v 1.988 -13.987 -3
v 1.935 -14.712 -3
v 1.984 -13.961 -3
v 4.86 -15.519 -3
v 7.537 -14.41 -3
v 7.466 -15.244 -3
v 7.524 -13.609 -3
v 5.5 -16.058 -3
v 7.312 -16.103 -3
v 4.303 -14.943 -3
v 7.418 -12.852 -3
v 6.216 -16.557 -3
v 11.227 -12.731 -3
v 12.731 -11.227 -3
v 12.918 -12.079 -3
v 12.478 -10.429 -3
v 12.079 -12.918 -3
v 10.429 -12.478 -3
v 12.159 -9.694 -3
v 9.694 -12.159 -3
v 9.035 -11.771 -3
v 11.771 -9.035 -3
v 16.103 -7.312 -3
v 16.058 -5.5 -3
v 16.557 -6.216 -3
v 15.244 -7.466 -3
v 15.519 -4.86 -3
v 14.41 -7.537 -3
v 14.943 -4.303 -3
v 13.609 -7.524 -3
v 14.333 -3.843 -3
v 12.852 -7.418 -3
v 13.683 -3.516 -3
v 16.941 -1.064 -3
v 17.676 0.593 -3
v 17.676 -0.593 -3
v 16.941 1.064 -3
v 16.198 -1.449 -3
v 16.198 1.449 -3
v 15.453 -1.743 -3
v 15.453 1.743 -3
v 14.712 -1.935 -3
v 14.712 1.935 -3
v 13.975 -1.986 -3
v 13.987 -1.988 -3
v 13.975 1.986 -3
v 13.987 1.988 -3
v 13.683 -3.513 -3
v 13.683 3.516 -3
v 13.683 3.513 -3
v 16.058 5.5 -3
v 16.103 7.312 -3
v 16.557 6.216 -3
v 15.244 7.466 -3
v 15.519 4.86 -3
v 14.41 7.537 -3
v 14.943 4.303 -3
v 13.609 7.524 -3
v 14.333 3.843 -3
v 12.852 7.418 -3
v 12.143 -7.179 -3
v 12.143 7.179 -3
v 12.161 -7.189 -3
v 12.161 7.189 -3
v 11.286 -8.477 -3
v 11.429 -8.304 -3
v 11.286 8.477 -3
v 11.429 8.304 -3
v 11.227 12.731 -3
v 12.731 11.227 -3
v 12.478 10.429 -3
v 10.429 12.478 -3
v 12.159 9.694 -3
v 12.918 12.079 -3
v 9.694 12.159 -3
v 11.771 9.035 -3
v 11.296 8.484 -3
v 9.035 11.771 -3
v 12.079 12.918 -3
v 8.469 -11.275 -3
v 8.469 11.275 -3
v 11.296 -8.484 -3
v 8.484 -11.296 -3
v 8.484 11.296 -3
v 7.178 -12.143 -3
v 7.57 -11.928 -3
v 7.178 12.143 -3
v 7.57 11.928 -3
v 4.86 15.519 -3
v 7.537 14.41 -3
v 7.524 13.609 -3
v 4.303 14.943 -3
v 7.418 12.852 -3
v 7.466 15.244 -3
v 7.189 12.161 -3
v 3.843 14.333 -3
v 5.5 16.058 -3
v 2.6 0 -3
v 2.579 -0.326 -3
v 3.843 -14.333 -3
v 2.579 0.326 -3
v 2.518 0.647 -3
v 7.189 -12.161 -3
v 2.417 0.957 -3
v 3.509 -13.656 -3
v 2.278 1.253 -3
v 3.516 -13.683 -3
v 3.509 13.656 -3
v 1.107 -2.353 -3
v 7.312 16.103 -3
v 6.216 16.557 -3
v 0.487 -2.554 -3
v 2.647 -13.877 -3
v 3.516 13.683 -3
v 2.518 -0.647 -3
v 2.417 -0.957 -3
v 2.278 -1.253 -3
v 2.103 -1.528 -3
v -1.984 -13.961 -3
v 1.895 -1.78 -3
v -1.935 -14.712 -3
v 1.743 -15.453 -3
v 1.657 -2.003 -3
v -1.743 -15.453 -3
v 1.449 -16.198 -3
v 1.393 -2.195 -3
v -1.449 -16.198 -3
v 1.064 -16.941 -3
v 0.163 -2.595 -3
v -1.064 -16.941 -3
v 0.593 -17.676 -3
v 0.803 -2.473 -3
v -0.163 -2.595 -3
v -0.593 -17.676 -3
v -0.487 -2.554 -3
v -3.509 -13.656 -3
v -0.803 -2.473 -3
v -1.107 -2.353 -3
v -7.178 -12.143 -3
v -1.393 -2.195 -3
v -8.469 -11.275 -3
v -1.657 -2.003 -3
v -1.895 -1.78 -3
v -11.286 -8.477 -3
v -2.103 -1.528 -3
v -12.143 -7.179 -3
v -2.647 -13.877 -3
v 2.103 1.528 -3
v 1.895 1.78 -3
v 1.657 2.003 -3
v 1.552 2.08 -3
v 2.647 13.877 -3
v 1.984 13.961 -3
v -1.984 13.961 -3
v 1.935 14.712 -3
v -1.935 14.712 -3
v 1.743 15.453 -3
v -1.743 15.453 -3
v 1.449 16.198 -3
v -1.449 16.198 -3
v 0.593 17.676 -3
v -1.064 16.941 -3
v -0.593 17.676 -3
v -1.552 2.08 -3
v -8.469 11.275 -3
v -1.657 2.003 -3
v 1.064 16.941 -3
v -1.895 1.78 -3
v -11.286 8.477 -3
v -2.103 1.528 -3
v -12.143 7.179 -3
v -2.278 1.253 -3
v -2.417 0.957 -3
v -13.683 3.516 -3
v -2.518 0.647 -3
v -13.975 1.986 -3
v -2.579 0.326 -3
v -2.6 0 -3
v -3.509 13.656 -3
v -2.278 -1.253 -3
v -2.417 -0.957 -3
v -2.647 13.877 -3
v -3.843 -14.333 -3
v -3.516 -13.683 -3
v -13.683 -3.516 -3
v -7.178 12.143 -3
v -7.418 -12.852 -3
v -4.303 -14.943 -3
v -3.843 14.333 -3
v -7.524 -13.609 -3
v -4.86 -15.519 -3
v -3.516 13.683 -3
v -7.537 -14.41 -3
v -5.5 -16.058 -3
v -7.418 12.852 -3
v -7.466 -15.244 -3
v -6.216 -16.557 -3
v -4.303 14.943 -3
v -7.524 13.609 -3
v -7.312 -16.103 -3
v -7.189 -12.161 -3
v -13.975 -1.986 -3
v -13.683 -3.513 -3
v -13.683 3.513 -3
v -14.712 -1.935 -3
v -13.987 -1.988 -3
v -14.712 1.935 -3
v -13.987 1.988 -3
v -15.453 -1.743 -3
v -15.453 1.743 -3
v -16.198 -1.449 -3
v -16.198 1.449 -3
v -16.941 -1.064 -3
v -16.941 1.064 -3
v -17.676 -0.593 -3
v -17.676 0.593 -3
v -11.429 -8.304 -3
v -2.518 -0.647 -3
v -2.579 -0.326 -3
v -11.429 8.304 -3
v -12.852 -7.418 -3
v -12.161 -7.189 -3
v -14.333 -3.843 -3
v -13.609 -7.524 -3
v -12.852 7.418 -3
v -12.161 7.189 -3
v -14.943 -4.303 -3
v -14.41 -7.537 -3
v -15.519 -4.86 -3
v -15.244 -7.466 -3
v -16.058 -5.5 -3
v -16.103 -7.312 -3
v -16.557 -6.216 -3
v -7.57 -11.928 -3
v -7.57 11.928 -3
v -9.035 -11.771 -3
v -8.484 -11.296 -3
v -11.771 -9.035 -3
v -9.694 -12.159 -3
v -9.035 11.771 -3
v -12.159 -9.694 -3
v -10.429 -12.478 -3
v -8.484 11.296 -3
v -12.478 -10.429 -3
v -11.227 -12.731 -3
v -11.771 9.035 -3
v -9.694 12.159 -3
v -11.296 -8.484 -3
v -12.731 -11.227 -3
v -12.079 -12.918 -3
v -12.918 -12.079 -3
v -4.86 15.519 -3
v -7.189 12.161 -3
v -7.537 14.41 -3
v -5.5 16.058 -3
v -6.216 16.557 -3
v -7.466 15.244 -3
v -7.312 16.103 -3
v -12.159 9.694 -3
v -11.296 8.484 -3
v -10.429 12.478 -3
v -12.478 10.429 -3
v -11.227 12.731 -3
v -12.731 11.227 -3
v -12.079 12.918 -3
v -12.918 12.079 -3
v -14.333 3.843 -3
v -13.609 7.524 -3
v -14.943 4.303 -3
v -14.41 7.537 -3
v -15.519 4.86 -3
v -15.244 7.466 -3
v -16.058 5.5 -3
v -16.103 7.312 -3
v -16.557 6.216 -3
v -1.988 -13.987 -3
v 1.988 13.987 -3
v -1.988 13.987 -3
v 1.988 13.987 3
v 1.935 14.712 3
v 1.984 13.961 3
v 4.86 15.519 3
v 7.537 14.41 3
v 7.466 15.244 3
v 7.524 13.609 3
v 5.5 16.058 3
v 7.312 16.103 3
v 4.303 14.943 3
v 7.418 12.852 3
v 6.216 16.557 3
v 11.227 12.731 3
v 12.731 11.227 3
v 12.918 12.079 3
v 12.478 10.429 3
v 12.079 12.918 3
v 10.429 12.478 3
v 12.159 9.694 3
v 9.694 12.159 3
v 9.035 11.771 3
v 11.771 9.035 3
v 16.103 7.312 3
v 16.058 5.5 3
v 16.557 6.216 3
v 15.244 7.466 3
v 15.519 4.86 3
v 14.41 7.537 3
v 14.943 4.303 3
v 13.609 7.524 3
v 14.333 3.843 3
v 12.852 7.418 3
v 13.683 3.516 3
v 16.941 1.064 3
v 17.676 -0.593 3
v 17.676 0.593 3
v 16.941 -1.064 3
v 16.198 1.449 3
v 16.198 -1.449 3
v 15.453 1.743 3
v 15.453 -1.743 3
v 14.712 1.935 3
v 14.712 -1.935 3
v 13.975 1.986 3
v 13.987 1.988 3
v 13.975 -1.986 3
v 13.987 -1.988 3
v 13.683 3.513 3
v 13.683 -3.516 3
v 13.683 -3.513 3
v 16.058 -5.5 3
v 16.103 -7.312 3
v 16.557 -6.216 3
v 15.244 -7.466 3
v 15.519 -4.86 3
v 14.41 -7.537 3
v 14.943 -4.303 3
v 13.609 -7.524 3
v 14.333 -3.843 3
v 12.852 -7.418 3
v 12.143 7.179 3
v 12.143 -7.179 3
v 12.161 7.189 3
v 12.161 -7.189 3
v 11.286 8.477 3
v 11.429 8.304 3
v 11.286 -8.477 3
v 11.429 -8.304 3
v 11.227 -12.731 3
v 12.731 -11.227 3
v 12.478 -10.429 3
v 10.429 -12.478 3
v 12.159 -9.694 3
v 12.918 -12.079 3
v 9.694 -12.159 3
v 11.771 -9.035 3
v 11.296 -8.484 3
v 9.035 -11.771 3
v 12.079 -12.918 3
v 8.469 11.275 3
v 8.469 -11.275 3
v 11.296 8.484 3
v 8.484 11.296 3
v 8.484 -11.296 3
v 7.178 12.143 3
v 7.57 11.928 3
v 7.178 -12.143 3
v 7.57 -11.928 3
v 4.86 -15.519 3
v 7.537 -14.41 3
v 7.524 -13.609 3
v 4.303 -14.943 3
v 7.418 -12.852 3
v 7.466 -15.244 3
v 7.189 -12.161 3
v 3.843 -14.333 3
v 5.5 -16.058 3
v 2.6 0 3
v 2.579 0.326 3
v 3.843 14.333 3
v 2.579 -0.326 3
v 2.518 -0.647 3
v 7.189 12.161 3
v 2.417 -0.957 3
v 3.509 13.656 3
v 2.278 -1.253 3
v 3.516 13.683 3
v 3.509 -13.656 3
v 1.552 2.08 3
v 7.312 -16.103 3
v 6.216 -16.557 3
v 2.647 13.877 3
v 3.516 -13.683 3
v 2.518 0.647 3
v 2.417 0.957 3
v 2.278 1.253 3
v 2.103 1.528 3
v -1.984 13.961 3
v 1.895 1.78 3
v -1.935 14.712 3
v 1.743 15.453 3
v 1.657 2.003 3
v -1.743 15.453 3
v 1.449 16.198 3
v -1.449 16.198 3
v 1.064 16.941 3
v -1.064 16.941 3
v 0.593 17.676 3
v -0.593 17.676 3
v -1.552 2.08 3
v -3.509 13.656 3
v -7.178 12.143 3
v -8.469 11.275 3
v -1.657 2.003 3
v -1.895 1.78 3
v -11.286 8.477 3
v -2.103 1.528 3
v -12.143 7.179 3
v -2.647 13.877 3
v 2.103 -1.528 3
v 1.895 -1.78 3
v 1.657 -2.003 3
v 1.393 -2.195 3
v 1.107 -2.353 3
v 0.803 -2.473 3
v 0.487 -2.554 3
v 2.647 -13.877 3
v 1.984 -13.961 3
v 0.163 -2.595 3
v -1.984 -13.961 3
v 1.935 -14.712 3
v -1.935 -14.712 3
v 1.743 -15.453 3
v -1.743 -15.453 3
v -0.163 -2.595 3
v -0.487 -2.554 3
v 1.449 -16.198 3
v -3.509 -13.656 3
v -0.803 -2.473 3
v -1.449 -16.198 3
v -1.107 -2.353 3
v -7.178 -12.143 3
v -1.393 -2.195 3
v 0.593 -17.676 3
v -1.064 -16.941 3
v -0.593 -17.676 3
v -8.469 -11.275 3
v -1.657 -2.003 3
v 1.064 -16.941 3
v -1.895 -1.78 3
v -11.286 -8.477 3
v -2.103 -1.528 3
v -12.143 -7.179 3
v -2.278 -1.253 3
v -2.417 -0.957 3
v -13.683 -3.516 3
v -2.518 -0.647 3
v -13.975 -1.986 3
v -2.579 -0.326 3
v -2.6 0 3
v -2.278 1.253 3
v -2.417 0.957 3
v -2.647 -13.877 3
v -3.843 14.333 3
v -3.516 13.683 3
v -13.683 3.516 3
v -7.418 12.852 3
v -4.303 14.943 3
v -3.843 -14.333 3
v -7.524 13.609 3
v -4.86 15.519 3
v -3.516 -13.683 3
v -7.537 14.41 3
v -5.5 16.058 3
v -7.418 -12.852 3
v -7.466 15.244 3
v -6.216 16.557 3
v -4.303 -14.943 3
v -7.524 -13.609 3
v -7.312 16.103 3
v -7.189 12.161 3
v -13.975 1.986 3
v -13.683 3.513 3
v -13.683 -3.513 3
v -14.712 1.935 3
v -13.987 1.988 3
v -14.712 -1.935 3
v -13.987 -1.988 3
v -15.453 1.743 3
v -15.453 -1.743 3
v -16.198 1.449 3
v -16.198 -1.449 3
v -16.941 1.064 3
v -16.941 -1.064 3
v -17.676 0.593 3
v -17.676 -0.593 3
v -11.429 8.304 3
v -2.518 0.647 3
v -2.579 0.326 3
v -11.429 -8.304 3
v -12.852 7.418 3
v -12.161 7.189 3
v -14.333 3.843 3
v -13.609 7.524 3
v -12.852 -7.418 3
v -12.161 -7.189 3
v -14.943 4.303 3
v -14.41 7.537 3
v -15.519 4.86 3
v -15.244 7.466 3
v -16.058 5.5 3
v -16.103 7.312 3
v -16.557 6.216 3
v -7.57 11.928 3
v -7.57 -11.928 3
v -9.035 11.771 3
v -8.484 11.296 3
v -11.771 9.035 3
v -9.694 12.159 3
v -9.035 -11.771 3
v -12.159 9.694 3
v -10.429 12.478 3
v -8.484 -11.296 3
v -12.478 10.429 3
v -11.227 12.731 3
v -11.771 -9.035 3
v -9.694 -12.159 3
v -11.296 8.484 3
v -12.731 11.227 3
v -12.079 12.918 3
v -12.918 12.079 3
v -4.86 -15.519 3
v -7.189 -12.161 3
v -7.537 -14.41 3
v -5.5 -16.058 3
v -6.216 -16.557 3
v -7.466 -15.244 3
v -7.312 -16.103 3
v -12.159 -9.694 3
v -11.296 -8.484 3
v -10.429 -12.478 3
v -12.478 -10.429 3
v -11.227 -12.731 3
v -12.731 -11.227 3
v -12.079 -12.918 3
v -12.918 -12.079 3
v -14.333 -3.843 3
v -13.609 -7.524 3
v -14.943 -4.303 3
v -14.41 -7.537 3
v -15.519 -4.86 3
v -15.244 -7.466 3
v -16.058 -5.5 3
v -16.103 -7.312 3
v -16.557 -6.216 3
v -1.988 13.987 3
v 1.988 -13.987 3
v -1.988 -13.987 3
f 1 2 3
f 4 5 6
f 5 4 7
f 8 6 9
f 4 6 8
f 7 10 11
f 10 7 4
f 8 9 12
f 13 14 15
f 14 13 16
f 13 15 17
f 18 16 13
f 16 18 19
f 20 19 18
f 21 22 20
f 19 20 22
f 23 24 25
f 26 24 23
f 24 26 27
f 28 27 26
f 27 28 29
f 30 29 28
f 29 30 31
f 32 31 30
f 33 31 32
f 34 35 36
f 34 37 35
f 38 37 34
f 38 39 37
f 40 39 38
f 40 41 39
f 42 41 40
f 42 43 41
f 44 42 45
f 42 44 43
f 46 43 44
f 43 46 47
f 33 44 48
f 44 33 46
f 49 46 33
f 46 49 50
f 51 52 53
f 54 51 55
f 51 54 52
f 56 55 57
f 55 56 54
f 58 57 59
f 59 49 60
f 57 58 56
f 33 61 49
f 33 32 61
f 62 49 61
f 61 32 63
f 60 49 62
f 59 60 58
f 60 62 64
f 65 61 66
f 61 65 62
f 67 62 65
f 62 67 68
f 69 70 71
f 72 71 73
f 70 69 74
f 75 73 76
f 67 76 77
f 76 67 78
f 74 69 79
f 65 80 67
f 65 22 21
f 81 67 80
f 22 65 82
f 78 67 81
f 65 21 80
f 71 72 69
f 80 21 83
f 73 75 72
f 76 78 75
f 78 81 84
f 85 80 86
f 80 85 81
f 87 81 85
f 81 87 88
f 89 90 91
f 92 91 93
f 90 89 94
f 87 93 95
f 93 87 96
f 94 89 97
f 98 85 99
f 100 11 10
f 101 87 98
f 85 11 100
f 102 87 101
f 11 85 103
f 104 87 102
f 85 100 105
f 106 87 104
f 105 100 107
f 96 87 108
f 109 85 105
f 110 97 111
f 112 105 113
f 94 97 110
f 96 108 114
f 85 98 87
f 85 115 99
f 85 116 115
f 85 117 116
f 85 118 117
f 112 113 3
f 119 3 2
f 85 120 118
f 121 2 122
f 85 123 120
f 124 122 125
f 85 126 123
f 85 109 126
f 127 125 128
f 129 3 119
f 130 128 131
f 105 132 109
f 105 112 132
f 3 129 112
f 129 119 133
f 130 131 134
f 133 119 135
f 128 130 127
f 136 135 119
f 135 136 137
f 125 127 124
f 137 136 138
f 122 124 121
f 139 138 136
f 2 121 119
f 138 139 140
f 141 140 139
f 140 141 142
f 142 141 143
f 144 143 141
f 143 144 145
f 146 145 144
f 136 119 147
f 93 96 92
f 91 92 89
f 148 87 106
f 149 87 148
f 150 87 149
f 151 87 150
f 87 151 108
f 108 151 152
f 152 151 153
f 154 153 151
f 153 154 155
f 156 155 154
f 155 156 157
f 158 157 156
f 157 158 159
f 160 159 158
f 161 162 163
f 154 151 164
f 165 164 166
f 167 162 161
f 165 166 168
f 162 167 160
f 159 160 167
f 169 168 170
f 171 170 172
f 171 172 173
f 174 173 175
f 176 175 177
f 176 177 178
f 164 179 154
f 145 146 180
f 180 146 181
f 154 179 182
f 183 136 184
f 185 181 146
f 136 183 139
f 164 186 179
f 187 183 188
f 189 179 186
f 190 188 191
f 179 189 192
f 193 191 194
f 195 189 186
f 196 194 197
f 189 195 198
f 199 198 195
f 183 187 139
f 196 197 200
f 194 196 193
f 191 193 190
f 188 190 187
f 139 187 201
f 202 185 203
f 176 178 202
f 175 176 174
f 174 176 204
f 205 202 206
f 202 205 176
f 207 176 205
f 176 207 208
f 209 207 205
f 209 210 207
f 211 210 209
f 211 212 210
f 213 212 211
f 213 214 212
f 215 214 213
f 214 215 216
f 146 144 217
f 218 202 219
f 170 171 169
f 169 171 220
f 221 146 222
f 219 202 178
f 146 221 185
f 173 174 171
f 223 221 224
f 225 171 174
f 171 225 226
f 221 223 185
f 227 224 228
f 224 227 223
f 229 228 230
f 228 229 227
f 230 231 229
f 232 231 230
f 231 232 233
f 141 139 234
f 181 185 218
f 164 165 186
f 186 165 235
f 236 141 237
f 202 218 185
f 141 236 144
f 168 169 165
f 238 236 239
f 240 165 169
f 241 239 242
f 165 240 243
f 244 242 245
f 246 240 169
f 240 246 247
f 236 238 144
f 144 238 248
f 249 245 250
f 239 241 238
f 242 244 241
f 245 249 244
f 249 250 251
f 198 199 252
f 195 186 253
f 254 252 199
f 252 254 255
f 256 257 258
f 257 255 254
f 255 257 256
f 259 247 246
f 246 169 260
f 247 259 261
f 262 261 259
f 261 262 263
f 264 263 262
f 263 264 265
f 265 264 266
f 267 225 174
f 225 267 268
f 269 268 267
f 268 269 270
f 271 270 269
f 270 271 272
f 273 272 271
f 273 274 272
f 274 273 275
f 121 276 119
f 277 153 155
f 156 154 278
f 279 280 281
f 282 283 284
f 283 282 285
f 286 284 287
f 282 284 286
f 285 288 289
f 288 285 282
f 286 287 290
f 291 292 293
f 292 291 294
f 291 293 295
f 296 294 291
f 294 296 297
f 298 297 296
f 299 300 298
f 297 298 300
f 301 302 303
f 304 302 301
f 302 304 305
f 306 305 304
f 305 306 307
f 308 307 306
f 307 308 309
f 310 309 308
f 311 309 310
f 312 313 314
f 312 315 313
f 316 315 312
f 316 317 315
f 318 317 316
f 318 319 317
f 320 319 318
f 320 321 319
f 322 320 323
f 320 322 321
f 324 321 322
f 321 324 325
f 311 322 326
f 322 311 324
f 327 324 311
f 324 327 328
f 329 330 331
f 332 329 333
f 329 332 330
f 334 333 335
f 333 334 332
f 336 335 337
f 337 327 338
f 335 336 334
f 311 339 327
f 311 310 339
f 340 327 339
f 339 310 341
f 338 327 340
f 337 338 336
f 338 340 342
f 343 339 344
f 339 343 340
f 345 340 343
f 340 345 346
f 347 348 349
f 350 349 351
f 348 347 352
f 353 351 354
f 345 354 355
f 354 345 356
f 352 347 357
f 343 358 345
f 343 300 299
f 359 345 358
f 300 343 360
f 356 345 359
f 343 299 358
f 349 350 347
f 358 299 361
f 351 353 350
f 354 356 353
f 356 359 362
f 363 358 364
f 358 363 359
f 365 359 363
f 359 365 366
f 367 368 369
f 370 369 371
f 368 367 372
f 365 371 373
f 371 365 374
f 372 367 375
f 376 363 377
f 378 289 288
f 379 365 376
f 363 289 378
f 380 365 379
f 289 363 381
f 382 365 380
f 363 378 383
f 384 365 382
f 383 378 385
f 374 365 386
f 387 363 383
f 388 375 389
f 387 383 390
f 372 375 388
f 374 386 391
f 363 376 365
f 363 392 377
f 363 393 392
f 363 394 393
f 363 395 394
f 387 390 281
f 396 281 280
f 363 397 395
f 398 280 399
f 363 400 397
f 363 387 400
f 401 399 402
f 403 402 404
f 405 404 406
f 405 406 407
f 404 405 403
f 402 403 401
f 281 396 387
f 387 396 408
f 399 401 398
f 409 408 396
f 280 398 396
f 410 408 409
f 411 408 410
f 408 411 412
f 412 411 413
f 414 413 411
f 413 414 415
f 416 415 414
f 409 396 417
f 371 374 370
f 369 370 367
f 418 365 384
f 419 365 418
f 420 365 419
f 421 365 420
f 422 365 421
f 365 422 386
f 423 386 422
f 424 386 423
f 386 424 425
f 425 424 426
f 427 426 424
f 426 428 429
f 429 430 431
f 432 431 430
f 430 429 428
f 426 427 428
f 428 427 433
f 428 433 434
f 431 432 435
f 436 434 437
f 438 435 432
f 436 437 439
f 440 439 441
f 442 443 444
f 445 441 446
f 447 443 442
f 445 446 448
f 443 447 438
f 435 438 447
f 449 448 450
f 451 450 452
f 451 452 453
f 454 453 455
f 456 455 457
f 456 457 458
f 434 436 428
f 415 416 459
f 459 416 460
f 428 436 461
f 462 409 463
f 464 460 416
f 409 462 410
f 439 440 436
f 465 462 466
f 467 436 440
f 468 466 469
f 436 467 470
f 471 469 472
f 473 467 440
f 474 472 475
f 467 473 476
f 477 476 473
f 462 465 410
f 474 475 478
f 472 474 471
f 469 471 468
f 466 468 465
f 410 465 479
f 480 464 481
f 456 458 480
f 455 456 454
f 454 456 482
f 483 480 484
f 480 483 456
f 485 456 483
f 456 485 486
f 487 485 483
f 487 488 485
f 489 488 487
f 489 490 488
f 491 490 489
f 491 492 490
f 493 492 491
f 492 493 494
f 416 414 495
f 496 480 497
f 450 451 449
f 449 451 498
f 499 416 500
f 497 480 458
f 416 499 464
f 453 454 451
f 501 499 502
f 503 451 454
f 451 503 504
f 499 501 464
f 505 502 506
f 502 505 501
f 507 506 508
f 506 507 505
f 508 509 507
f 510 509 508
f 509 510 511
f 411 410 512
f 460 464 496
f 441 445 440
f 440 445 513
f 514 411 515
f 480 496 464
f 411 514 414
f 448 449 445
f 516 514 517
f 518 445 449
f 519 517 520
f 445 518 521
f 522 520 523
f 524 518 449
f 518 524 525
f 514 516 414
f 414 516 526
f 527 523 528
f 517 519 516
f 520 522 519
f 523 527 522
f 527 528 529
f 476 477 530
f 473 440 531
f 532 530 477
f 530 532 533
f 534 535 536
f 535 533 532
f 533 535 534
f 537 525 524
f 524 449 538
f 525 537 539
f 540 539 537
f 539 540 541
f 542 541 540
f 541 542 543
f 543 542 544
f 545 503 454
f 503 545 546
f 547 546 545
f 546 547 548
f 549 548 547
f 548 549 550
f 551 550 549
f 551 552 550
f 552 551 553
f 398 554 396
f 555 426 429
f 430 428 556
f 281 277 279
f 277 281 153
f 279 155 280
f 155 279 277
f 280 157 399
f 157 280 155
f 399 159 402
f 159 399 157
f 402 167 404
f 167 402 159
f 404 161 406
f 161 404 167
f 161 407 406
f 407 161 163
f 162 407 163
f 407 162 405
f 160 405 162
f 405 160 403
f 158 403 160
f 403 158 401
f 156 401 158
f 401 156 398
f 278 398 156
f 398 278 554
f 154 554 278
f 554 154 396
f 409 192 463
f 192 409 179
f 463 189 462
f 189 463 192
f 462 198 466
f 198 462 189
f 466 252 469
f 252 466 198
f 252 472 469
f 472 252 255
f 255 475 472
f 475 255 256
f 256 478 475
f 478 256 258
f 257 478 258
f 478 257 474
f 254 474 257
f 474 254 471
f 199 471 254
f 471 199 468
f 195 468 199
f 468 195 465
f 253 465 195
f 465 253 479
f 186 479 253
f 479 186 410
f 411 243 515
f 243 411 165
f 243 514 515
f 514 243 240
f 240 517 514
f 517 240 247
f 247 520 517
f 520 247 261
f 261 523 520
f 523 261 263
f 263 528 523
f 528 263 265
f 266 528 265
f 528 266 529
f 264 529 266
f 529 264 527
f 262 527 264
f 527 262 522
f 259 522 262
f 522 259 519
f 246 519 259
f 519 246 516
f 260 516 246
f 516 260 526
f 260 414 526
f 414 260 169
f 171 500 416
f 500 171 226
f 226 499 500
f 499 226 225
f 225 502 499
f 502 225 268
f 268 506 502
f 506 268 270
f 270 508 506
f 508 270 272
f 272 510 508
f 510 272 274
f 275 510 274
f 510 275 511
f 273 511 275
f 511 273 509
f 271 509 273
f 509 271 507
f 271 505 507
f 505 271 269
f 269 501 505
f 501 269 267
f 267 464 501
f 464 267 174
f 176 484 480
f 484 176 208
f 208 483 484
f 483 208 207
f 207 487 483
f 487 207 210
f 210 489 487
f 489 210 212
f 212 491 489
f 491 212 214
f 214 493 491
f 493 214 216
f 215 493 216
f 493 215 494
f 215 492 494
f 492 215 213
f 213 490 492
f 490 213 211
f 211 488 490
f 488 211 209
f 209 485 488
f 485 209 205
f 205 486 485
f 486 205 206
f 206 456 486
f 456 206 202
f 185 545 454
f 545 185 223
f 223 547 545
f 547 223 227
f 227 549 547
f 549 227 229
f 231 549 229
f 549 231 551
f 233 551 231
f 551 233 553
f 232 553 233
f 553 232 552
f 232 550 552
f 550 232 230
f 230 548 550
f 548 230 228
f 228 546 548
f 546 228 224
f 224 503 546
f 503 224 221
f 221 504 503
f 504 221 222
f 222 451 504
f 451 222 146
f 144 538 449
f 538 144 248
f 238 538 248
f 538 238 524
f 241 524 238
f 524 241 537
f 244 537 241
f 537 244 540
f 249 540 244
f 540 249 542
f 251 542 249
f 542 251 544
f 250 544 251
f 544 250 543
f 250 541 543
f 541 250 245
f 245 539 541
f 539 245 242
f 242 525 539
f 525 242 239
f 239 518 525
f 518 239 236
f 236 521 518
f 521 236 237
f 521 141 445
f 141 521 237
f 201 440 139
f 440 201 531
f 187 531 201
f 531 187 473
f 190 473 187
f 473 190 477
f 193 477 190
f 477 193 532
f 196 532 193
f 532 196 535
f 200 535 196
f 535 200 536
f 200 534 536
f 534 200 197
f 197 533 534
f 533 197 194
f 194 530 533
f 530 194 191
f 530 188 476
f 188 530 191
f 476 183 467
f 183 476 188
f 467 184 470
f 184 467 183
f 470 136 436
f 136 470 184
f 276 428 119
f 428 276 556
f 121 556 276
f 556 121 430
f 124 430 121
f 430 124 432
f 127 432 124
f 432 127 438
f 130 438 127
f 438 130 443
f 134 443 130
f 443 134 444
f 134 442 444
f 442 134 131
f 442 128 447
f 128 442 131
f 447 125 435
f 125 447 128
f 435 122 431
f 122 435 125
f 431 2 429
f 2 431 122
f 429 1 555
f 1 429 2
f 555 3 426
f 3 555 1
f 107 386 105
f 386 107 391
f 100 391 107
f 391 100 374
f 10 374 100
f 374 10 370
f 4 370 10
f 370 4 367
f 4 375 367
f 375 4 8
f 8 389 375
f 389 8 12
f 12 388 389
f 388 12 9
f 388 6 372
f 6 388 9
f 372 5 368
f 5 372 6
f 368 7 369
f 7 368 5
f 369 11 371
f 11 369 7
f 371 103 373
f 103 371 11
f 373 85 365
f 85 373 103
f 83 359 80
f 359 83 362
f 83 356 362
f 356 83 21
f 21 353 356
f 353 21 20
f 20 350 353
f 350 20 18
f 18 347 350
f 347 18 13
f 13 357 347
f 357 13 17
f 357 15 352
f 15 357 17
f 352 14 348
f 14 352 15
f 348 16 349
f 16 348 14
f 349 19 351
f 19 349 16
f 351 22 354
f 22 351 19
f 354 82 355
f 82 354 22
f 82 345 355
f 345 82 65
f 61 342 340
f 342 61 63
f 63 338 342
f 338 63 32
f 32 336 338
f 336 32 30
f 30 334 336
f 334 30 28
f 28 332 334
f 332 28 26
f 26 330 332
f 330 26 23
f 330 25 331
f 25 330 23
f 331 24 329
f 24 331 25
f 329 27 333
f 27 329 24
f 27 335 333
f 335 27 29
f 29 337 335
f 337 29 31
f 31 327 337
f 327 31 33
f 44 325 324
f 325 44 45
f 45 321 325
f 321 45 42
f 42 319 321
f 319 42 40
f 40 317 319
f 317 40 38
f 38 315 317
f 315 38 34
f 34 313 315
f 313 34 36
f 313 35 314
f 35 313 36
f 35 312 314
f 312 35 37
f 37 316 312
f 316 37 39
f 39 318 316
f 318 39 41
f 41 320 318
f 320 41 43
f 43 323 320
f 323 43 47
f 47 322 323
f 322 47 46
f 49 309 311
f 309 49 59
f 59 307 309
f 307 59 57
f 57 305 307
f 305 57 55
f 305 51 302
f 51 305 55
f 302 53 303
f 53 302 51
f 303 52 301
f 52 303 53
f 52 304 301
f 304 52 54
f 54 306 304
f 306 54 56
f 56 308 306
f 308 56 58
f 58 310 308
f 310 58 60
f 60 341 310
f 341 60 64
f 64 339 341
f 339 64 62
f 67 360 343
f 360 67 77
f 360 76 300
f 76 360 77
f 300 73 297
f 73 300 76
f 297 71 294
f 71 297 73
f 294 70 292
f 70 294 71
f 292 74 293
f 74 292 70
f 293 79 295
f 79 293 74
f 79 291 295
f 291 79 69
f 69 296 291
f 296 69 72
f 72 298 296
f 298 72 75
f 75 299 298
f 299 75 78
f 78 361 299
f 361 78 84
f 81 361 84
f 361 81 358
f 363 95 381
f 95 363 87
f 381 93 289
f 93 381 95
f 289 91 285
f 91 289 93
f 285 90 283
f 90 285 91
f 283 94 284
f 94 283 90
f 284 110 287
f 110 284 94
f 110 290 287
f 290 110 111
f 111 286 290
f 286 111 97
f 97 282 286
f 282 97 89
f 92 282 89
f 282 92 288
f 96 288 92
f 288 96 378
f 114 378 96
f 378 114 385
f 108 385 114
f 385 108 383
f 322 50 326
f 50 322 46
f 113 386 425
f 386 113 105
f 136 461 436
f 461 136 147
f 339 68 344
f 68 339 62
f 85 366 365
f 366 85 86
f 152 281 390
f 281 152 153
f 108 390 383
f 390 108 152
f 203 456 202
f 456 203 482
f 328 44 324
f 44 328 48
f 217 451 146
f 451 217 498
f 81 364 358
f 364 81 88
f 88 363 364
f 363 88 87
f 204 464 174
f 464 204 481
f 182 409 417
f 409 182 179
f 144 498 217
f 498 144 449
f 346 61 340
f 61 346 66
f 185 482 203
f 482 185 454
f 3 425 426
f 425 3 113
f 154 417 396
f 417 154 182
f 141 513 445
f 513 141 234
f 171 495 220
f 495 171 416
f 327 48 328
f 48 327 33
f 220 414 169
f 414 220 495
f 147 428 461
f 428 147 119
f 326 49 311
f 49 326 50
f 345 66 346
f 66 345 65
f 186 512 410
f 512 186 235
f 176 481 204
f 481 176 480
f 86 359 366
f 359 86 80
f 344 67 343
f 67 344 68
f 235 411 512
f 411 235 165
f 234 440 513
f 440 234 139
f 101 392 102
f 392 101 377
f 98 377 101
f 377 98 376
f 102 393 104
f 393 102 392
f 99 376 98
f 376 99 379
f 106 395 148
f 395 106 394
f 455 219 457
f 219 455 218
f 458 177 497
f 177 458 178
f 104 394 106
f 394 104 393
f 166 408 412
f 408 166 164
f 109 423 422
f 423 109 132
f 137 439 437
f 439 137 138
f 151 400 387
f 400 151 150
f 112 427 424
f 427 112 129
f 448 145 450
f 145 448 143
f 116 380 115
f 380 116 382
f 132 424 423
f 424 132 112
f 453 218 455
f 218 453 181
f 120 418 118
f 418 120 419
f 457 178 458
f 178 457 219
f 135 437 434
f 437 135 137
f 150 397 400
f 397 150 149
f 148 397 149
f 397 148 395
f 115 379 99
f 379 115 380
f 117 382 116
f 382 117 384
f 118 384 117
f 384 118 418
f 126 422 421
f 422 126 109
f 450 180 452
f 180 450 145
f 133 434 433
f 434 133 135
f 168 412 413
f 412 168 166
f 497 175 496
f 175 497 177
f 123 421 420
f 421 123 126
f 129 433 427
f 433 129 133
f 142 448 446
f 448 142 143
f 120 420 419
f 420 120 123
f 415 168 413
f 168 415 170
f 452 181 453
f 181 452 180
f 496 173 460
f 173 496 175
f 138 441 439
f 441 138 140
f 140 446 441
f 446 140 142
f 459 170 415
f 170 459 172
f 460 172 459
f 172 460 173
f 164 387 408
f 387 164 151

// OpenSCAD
//////////////////////////////////////////////////////////////////////////////////////////////
// Public Domain Parametric Involute Spur Gear (and involute helical gear and involute rack)
// version 1.2
// by Leemon Baird, 2011, Leemon@Leemon.com
// http://www.thingiverse.com/thing:5505
// updated, 2015, by CNT.
// http://www.thingiverse.com/thing:900277
//   CNT updates:
//      -adopted NateTG's fix for rack
//      -fixed bad input to example gear
//      -replaced references to 3.14159... with PI
//      -removed use of depricated assign() function.
//      -added hole types
//      -added thingiverse customizer options
//
//
// This file is public domain.  Use it for any purpose, including commercial
// applications.  Attribution would be nice, but is not required.  There is
// no warranty of any kind, including its correctness, usefulness, or safety.
// 
// This is parameterized involute spur (or helical) gear.  It is much simpler and less powerful than
// others on Thingiverse.  But it is public domain.  I implemented it from scratch from the 
// descriptions and equations on Wikipedia and the web, using Mathematica for calculations and testing,
// and I now release it into the public domain.
//
//    http://en.wikipedia.org/wiki/Involute_gear
//    http://en.wikipedia.org/wiki/Gear
//    http://en.wikipedia.org/wiki/List_of_gear_nomenclature
//    http://gtrebaol.free.fr/doc/catia/spur_gear.html
//    http://www.cs.cmu.edu/~rapidproto/mechanisms/chpt7.html
//
// The module gear() gives an involute spur gear, with reasonable defaults for all the parameters.
// Normally, you should just choose the first 4 parameters, and let the rest be default values.
// The module gear() gives a gear in the XY plane, centered on the origin, with one tooth centered on
// the positive Y axis.  The various functions below it take the same parameters, and return various
// measurements for the gear.  The most important is pitch_radius, which tells how far apart to space
// gears that are meshing, and adendum_radius, which gives the size of the region filled by the gear.
// A gear has a "pitch circle", which is an invisible circle that cuts through the middle of each
// tooth (though not the exact center). In order for two gears to mesh, their pitch circles should 
// just touch.  So the distance between their centers should be pitch_radius() for one, plus pitch_radius() 
// for the other, which gives the radii of their pitch circles.
//
// In order for two gears to mesh, they must have the same mm_per_tooth and pressure_angle parameters.  
// mm_per_tooth gives the number of millimeters of arc around the pitch circle covered by one tooth and one
// space between teeth.  The pitch angle controls how flat or bulged the sides of the teeth are.  Common
// values include 14.5 degrees and 20 degrees, and occasionally 25.  Though I've seen 28 recommended for
// plastic gears. Larger numbers bulge out more, giving stronger teeth, so 28 degrees is the default here.
//
// The ratio of number_of_teeth for two meshing gears gives how many times one will make a full 
// revolution when the the other makes one full revolution.  If the two numbers are coprime (i.e. 
// are not both divisible by the same number greater than 1), then every tooth on one gear
// will meet every tooth on the other, for more even wear.  So coprime numbers of teeth are good.
//
// The module rack() gives a rack, which is a bar with teeth.  A rack can mesh with any
// gear that has the same mm_per_tooth and pressure_angle.
//
// Some terminology: 
// The outline of a gear is a smooth circle (the "pitch circle") which has mountains and valleys
// added so it is toothed.  So there is an inner circle (the "root circle") that touches the 
// base of all the teeth, an outer circle that touches the tips of all the teeth,
// and the invisible pitch circle in between them.  There is also a "base circle", which can be smaller than
// all three of the others, which controls the shape of the teeth.  The side of each tooth lies on the path 
// that the end of a string would follow if it were wrapped tightly around the base circle, then slowly unwound.  
// That shape is an "involute", which gives this type of gear its name.
//
//////////////////////////////////////////////////////////////////////////////////////////////
// preview[view:south, tilt:top]
/* [Hidden] */
$fn=50;

/* [Parameters] */
//choose gear type
gear_type = 1; //[1:Gear(or single-helical), 0:Rack, 2:Double-helical]
//choose number of teeth or pitch radius (num teeth = pitch)
num_teeth_or_pitch = 16; 
//helix angle for helical gears.  set to 0 for normal gears.  Note that meshing gears need opposite angles.
helix_angle = 0; //[-45:45]
//Gear thickness
thickness    = 6;
//hole diameter (flat to flat for hexagonal hole)
hole         = 5.2;
hole_type = 1; //[0:round, 1:D shaft, 2: hex bolt head]

//percent of tooth cutoff to allow for clearance between tooth.  A high clearance may cause backlash while a low percentage may cause binding if the gears aren't printed perfectly.
clearance_percentage = 5;

//height of gear rack (for racks only)
height_of_rack       = 10;


/* [Hidden] */
mm_per_tooth = 2*PI; //all meshing gears need the same mm_per_tooth (and the same pressure_angle)

ha = 90-helix_angle;
twst = 360*(thickness/tan(ha))/(2*PI*pitch_radius(mm_per_tooth,num_teeth_or_pitch));

if (gear_type==1) {
  difference () { 
    gear(mm_per_tooth,num_teeth_or_pitch,thickness,0,twst,clearance=mm_per_tooth*clearance_percentage/100);
    if (hole_type == 2) {
      hexagon (hole,2*thickness);
    }  
    if(hole_type == 1) {
      Dshaft(hole,hole/10.0,thickness*2);
    }
    if(hole_type == 0) {
      cylinder(h= thickness*2,r=hole/2,center=true);
    }
  }
}else if (gear_type==2) {
  difference () { 
    union() {
      translate([0,0,thickness/4])
        gear(mm_per_tooth,num_teeth_or_pitch,thickness/2,0,twst,clearance=mm_per_tooth*clearance_percentage/100);
      translate([0,0,-thickness/4]) mirror([0,0,1])
        gear(mm_per_tooth,num_teeth_or_pitch,thickness/2,0,twst,clearance=mm_per_tooth*clearance_percentage/100);
    }
    if (hole_type == 2) {
      hexagon (hole,2*thickness);
    }  
    if(hole_type == 1) {
      Dshaft(hole,hole/10.0,thickness*2);
    }
    if(hole_type == 0) {
      cylinder(h= thickness*2,r=hole/2,center=true);
    }
  }
} else {
  translate([-mm_per_tooth*num_teeth_or_pitch/2,0,0])
    rack(mm_per_tooth,num_teeth_or_pitch,thickness,height_of_rack);
}


// size is the XY plane size, height in Z
module hexagon(size, height) {
  boxWidth = size/1.75;
  for (r = [-60, 0, 60]) rotate([0,0,r]) cube([boxWidth, size, height], true);
}

module Dshaft(diameter,flat,height) {
  difference(){
    cylinder(h= height,r=diameter/2,center=true);
    translate([0,diameter-flat,0]) cube([diameter,diameter,height*2],center=true);
  }
}

//An involute spur gear, with reasonable defaults for all the parameters.
//Normally, you should just choose the first 4 parameters, and let the rest be default values.
//Meshing gears must match in mm_per_tooth, pressure_angle, and twist,
//and be separated by the sum of their pitch radii, which can be found with pitch_radius().
module gear (
  mm_per_tooth    = 3,    //this is the "circular pitch", the circumference of the pitch circle divided by the number of teeth
  number_of_teeth = 11,   //total number of teeth around the entire perimeter
  thickness       = 6,    //thickness of gear in mm
  hole_diameter   = 3,    //diameter of the hole in the center, in mm
  twist           = 0,    //teeth rotate this many degrees from bottom of gear to top.  360 makes the gear a screw with each thread going around once
  teeth_to_hide   = 0,    //number of teeth to delete to make this only a fraction of a circle
  pressure_angle  = 28,   //Controls how straight or bulged the tooth sides are. In degrees.
  clearance       = 0.0,  //gap between top of a tooth on one gear and bottom of valley on a meshing gear (in millimeters)
  backlash        = 0.0   //gap between two meshing teeth, in the direction along the circumference of the pitch circle
) {
  p  = mm_per_tooth * number_of_teeth / PI / 2;  //radius of pitch circle
  c  = p + mm_per_tooth / PI - clearance;        //radius of outer circle
  b  = p*cos(pressure_angle);                    //radius of base circle
  r  = p-(c-p)-clearance;                        //radius of root circle
  t  = mm_per_tooth/2-backlash/2 ;               //tooth thickness at PItch circle
  k  = -iang(b, p) - t/2/p/PI*180; {             //angle to where involute meets base circle on each side of tooth
    difference() {
      union() {
      for (i = [0:number_of_teeth-teeth_to_hide-1] )
        rotate([0,0,i*360/number_of_teeth])
          linear_extrude(height = thickness, center = true, convexity = 30, twist = twist)
            polygon(
              points=[
                [0, -hole_diameter/10],
                polar(r, -181/number_of_teeth),
                polar(r, r<b ? k : -180/number_of_teeth),
                q7(0/5,r,b,c,k, 1),q7(1/5,r,b,c,k, 1),q7(2/5,r,b,c,k, 1),q7(3/5,r,b,c,k, 1),q7(4/5,r,b,c,k, 1),q7(5/5,r,b,c,k, 1),
                q7(5/5,r,b,c,k,-1),q7(4/5,r,b,c,k,-1),q7(3/5,r,b,c,k,-1),q7(2/5,r,b,c,k,-1),q7(1/5,r,b,c,k,-1),q7(0/5,r,b,c,k,-1),
                polar(r, r<b ? -k : 180/number_of_teeth),
                polar(r, 181/number_of_teeth)
              ],
              paths=[[0,1,2,3,4,5,6,7,8,9,10,11,12,13,14,15,16]]
            );
      //shouldn't need this but otherwise openSCAD creates a broken solid.
      cylinder(h=thickness,r=b,center=true);
      }
      cylinder(h=2*thickness+1, r=hole_diameter/2, center=true, $fn=50);
    }
  }
};  
//these 4 functions are used by gear
function polar(r,theta)   = r*[sin(theta), cos(theta)];                            //convert polar to cartesian coordinates
function iang(r1,r2)      = sqrt((r2/r1)*(r2/r1) - 1)/PI*180 - acos(r1/r2); //unwind a string this many degrees to go from radius r1 to radius r2
function q7(f,r,b,r2,t,s) = q6(b,s,t,(1-f)*max(b,r)+f*r2);                         //radius a fraction f up the curved side of the tooth 
function q6(b,s,t,d)      = polar(d,s*(iang(b,d)+t));                              //point at radius d on the involute curve

//a rack, which is a straight line with teeth (the same as a segment from a giant gear with a huge number of teeth).
//The "pitch circle" is a line along the X axis.
module rack (
  mm_per_tooth    = 3,    //this is the "circular pitch", the circumference of the pitch circle divided by the number of teeth
  number_of_teeth = 11,   //total number of teeth along the rack
  thickness       = 6,    //thickness of rack in mm (affects each tooth)
  height          = 120,   //height of rack in mm, from tooth top to far side of rack.
  pressure_angle  = 28,   //Controls how straight or bulged the tooth sides are. In degrees.
  backlash        = 0.0   //gap between two meshing teeth, in the direction along the circumference of the pitch circle
) {
  a = mm_per_tooth / PI; //addendum
    //Note: applied NateTG's fix
  t = a/2*cos(pressure_angle);         //tooth side is tilted so top/bottom corners move this amount
    for (i = [0:number_of_teeth-1] )
        translate([i*mm_per_tooth,0,0])
            linear_extrude(height = thickness, center = true, convexity = 30)
                polygon(
                    points=[
                        [-mm_per_tooth * 3/4,                 a-height],
                        [-mm_per_tooth * 3/4 - backlash,     -a],
                        [-mm_per_tooth * 1/4 + backlash - t, -a],
                        [-mm_per_tooth * 1/4 + backlash + t,  a],
                        [ mm_per_tooth * 1/4 - backlash - t,  a],
                        [ mm_per_tooth * 1/4 - backlash + t, -a],
                        [ mm_per_tooth * 3/4 + backlash,     -a],
                        [ mm_per_tooth * 3/4,                 a-height],
                    ],
                    paths=[[0,1,2,3,4,5,6,7]]
                );
};  

//These 5 functions let the user find the derived dimensions of the gear.
//A gear fits within a circle of radius outer_radius, and two gears should have
//their centers separated by the sum of their pictch_radius.
function circular_pitch  (mm_per_tooth=3) = mm_per_tooth;                     //tooth density expressed as "circular pitch" in millimeters
function diametral_pitch (mm_per_tooth=3) = PI / mm_per_tooth;         //tooth density expressed as "diametral pitch" in teeth per millimeter
function module_value    (mm_per_tooth=3) = mm_per_tooth / PI;                //tooth density expressed as "module" or "modulus" in millimeters
function pitch_radius    (mm_per_tooth=3,number_of_teeth=11) = mm_per_tooth * number_of_teeth / PI / 2;
function outer_radius    (mm_per_tooth=3,number_of_teeth=11,clearance=0.1)    //The gear fits entirely within a cylinder of this radius.
  = mm_per_tooth*(1+number_of_teeth/2)/PI  - clearance;              

//////////////////////////////////////////////////////////////////////////////////////////////
//example gear train.  
//Try it with OpenSCAD View/Animate command with 20 steps and 24 FPS.
//The gears will continue to be rotated to mesh correctly if you change the number of teeth.



